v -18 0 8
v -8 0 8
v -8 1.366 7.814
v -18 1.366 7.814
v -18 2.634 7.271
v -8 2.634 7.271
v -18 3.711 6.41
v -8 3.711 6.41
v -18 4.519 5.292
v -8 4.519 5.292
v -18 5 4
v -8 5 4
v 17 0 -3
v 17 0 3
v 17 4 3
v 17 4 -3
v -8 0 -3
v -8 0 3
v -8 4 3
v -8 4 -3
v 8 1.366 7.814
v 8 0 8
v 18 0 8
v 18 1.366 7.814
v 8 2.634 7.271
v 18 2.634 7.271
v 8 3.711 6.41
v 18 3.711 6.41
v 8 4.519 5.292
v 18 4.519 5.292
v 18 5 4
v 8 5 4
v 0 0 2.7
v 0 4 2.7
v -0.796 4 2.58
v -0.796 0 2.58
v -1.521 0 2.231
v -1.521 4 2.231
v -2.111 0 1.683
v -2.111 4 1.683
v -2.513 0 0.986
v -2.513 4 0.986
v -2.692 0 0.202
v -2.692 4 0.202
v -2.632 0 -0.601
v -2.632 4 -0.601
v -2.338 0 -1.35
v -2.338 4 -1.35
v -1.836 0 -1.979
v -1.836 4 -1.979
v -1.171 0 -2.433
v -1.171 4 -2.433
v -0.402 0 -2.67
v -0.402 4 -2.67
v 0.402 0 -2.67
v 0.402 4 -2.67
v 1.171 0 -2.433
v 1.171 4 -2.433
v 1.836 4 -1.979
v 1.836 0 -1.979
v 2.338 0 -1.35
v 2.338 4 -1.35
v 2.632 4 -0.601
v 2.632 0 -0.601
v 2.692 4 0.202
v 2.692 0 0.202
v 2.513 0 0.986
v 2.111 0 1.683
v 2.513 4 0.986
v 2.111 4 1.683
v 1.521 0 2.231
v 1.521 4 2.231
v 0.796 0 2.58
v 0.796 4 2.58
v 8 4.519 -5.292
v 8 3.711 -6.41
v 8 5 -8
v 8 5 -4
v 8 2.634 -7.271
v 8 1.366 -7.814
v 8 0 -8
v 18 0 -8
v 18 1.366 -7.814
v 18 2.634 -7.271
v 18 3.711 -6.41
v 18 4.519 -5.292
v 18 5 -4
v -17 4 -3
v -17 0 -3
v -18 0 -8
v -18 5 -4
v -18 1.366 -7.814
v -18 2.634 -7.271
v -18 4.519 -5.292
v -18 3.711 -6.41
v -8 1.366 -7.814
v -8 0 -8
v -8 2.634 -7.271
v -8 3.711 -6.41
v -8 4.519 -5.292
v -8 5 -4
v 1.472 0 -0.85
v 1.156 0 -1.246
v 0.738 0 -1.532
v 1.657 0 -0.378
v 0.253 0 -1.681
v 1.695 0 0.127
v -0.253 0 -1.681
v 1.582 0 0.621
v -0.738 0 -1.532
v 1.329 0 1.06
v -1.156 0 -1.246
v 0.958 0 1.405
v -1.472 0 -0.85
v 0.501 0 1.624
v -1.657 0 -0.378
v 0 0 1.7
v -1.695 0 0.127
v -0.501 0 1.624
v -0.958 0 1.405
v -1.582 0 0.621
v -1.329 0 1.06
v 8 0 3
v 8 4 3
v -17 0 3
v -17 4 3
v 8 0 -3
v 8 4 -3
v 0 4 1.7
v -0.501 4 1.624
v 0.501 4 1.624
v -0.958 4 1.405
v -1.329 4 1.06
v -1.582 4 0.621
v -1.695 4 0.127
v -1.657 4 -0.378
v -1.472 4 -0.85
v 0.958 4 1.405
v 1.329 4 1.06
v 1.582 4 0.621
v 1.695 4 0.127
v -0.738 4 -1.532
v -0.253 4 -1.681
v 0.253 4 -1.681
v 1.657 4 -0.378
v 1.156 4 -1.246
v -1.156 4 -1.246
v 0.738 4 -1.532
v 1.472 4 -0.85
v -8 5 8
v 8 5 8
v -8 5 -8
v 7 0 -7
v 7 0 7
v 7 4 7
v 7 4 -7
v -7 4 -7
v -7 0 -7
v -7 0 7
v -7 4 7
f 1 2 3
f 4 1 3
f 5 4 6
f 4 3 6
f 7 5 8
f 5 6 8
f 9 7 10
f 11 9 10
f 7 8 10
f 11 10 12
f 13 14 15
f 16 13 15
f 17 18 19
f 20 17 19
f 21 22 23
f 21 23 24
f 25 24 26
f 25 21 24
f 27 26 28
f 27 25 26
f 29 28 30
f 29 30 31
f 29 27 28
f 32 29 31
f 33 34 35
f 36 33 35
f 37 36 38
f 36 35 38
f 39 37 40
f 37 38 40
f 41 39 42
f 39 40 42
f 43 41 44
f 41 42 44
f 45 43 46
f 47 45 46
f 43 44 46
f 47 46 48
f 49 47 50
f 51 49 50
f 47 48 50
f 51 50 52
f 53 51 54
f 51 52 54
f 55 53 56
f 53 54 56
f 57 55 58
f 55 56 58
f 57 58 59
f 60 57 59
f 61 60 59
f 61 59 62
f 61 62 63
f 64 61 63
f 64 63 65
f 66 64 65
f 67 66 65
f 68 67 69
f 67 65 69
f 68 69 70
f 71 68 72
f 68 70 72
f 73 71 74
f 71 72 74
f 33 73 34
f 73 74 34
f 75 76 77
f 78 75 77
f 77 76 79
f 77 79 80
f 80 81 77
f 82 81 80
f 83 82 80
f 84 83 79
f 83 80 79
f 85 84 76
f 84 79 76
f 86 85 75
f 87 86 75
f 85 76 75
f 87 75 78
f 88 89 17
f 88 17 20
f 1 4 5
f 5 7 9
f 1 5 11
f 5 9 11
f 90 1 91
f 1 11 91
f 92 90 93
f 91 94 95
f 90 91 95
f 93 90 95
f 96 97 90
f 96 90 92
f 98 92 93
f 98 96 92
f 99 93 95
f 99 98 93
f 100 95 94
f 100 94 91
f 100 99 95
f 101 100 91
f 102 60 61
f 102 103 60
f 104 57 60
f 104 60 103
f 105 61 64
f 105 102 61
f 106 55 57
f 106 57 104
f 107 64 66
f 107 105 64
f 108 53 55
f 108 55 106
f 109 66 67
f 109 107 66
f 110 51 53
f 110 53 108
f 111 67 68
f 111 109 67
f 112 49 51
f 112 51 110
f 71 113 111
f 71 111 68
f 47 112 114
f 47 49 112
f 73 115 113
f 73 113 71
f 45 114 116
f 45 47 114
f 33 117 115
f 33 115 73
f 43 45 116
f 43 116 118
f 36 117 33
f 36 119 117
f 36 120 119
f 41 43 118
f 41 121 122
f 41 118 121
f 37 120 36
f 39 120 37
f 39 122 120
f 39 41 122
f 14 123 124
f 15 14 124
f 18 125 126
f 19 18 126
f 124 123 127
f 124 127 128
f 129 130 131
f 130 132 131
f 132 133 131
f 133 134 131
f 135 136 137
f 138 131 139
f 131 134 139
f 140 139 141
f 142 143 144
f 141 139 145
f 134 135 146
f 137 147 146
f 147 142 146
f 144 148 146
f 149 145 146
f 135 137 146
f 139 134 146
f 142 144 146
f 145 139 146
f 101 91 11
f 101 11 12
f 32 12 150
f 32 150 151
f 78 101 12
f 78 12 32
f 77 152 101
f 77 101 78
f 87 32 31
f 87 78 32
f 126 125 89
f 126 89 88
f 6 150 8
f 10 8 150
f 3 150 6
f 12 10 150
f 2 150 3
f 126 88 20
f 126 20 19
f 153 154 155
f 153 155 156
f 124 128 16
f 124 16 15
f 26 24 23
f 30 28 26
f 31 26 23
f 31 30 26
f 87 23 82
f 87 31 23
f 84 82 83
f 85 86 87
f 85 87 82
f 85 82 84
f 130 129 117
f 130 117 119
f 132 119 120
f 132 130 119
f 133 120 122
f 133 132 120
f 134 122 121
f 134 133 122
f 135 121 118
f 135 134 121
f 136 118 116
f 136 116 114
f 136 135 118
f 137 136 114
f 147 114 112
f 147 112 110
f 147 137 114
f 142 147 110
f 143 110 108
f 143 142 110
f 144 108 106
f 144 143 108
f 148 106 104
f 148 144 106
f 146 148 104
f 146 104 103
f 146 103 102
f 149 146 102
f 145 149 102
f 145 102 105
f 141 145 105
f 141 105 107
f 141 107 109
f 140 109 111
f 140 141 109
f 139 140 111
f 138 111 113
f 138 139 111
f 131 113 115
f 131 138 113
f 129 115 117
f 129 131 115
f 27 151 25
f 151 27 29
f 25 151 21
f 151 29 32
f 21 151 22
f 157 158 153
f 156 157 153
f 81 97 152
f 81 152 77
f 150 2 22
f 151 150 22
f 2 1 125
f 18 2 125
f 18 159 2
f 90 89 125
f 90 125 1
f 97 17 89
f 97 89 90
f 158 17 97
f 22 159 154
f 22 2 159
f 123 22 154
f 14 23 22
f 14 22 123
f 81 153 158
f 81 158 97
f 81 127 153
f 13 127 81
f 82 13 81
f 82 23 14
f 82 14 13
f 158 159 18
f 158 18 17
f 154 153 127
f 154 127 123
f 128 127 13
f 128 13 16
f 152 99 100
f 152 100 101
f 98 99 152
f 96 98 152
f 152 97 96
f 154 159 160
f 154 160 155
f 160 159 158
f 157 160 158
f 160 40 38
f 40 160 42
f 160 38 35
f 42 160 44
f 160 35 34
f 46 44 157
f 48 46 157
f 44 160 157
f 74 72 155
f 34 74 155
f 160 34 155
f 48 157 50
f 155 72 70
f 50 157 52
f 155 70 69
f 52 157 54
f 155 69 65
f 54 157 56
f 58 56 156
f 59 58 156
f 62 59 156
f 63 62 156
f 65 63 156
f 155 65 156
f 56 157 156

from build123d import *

# Parameters (mm, degrees)
SKETCH1_W           = 16
SKETCH1_H           = 16
BOSS_EXTRUDE1_DEPTH = 5
SHELL1_T            = -1
SKETCH2_R           = 2.7
SKETCH2_R_2         = 1.7
BOSS_EXTRUDE2_DEPTH = 4
SKETCH3_W           = 8
SKETCH3_H           = 5
BOSS_EXTRUDE3_DEPTH = 10
SKETCH4_W           = 8
SKETCH4_H           = 5
BOSS_EXTRUDE4_DEPTH = 10
SHELL2_START        = -17
SHELL2_OUTLINE_W    = 4
SHELL2_OUTLINE_H    = 6
SHELL2_DEPTH        = 9
SHELL2_START_2      = 8
SHELL2_2_OUTLINE_W  = 4
SHELL2_2_OUTLINE_H  = 6
SHELL2_2_DEPTH      = 9
BOSS_EXTRUDE5_DEPTH = 10


# Read off the part's stored shape, not the designer's step: Shell2
with BuildPart() as part:
    # Sketch1 → Boss-Extrude1 (new body)
    with BuildSketch(Plane(origin=(0, 0, 0), x_dir=(1, 0, 0), z_dir=(0, 1, 0))):
        Rectangle(SKETCH1_W, SKETCH1_H)
    extrude(amount=BOSS_EXTRUDE1_DEPTH)

    # Shell1
    shell1_openings = [part.faces().sort_by_distance(p)[0] for p in [
        (0, 0, 0),
    ]]
    offset(amount=SHELL1_T, openings=shell1_openings, kind=Kind.INTERSECTION)

    # Sketch2 → Boss-Extrude2 (add)
    with BuildSketch(Plane.XZ.offset(-4)):
        with Locations(Location((0, 0, 0), (0, 0, 90))):
            Circle(SKETCH2_R)
        with Locations(Location((0, 0, 0), (0, 0, 90))):
            Circle(SKETCH2_R_2, mode=Mode.SUBTRACT)
    extrude(amount=BOSS_EXTRUDE2_DEPTH)

    # Sketch3 → Boss-Extrude3 (add)
    with BuildSketch(Plane.ZY.offset(8)):
        with Locations((0, 2.5)):
            Rectangle(SKETCH3_W, SKETCH3_H)
    extrude(amount=BOSS_EXTRUDE3_DEPTH)

    # Sketch4 → Boss-Extrude4 (add)
    with BuildSketch(Plane(origin=(8, 0, 0), x_dir=(0, 0, -1), z_dir=(1, 0, 0))):
        with Locations((0, 2.5)):
            Rectangle(SKETCH4_W, SKETCH4_H)
    extrude(amount=BOSS_EXTRUDE4_DEPTH)

    # Shell2 outline → Shell2 (cut)
    with BuildSketch(Plane.YZ.offset(SHELL2_START)):
        with Locations((2, 0)):
            Rectangle(SHELL2_OUTLINE_W, SHELL2_OUTLINE_H)
    extrude(amount=SHELL2_DEPTH, mode=Mode.SUBTRACT)

    # Shell2 2 outline → Shell2 2 (cut)
    with BuildSketch(Plane.YZ.offset(SHELL2_START_2)):
        with Locations((2, 0)):
            Rectangle(SHELL2_2_OUTLINE_W, SHELL2_2_OUTLINE_H)
    extrude(amount=SHELL2_2_DEPTH, mode=Mode.SUBTRACT)

    # Sketch5 → Boss-Extrude5 (add)
    with BuildSketch(Plane(origin=(8, 0, 0), x_dir=(0, 0, -1), z_dir=(1, 0, 0))):
        with BuildLine():
            Line((4, 0), (8, 0))
            ThreePointArc((8, 0), (6.876952648, 3.201562119), (4, 5))
            Line((4, 5), (4, 0))
        make_face()
        with BuildLine():
            Line((-4, 0), (-8, 0))
            ThreePointArc((-8, 0), (-6.876952648, 3.201562119), (-4, 5))
            Line((-4, 5), (-4, 0))
        make_face()
    boss_extrude5 = extrude(amount=BOSS_EXTRUDE5_DEPTH)

    # Mirror2: Boss-Extrude5 across plane
    add(boss_extrude5.mirror(Plane(origin=(0, 0, 0), x_dir=(0, 0, 1), z_dir=(1, 0, 0))))


solid = part.part
